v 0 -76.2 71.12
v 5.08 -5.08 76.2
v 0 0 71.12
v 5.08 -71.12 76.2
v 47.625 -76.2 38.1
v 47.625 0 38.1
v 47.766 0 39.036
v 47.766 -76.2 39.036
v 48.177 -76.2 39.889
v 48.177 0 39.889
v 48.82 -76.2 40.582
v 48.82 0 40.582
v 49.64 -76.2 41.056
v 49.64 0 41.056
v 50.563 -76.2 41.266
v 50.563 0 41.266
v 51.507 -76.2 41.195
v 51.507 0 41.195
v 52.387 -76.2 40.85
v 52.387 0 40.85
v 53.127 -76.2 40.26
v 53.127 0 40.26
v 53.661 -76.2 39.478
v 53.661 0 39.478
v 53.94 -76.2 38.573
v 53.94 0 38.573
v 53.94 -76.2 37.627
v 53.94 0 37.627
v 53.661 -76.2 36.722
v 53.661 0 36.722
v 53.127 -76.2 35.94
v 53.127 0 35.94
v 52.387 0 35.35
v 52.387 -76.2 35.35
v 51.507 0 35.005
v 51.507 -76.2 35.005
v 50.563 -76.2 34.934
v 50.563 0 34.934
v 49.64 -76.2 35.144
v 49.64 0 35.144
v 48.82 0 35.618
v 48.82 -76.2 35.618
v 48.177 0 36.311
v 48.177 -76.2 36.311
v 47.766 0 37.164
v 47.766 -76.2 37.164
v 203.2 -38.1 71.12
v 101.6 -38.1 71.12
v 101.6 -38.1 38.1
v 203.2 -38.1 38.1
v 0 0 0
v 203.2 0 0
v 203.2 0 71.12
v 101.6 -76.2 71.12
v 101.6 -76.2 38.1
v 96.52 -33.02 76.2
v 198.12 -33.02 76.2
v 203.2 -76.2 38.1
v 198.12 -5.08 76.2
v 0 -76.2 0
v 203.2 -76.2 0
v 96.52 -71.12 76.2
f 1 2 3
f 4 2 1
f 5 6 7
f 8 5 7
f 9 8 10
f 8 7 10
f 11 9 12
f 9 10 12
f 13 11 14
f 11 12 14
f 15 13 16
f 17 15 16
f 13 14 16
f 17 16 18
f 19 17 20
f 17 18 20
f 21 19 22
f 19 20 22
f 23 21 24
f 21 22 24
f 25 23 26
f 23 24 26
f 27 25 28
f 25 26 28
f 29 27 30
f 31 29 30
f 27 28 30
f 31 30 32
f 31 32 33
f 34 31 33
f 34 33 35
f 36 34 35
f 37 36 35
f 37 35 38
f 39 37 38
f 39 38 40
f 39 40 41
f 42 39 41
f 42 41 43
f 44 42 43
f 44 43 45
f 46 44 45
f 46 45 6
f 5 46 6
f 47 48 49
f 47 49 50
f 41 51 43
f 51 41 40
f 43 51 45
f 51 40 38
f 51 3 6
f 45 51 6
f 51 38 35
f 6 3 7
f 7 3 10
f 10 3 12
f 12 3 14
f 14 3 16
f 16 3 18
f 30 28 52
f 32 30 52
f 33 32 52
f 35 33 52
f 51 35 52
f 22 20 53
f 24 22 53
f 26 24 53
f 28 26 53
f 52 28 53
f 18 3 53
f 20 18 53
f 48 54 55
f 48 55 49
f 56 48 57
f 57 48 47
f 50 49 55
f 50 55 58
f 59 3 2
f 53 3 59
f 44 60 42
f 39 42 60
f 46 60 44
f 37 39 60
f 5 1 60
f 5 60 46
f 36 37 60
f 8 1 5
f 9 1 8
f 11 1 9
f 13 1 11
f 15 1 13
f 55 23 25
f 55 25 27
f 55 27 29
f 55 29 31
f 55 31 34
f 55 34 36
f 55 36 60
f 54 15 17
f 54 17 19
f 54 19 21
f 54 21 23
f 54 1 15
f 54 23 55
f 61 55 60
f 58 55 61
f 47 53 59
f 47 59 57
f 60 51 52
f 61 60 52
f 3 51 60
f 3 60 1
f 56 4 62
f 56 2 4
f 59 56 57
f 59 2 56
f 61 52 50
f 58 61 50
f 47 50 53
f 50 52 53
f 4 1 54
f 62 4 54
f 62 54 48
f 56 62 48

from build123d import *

# Parameters (mm, degrees)
F0_W     = 203.2
F0_H     = 76.2
F1_DEPTH = 76.2
F2_W     = 101.6
F2_H     = 38.1
F3_DEPTH = 38.1
F4_SIZE  = 5.08
F6_D     = 6.35


with BuildPart() as f1:
    # F0 (on Front) → F1 (new body)
    with BuildSketch(Plane.XZ):
        with Locations((101.6, 38.1)):
            Rectangle(F0_W, F0_H)
    extrude(amount=F1_DEPTH)

    # F2 (on face) → F3 (cut)
    with BuildSketch(Plane.XY.offset(76.2)):
        with Locations((152.4, -57.15)):
            Rectangle(F2_W, F2_H)
    extrude(amount=-F3_DEPTH, mode=Mode.SUBTRACT)

    # F4
    f4_edges = [f1.edges().sort_by_distance(p)[0] for p in [
        (50.8, -76.2, 76.2),
        (101.6, 0, 76.2),
        (0, -38.1, 76.2),
        (101.6, -57.15, 76.2),
        (152.4, -38.1, 76.2),
        (203.2, -19.05, 76.2),
    ]]
    chamfer(f4_edges, length=F4_SIZE)

    # F6 (through all)
    with Locations(Plane.XZ.offset(76.2)):
        with Locations((50.8, 38.1)):
            Hole(F6_D / 2)


solid = f1.part
